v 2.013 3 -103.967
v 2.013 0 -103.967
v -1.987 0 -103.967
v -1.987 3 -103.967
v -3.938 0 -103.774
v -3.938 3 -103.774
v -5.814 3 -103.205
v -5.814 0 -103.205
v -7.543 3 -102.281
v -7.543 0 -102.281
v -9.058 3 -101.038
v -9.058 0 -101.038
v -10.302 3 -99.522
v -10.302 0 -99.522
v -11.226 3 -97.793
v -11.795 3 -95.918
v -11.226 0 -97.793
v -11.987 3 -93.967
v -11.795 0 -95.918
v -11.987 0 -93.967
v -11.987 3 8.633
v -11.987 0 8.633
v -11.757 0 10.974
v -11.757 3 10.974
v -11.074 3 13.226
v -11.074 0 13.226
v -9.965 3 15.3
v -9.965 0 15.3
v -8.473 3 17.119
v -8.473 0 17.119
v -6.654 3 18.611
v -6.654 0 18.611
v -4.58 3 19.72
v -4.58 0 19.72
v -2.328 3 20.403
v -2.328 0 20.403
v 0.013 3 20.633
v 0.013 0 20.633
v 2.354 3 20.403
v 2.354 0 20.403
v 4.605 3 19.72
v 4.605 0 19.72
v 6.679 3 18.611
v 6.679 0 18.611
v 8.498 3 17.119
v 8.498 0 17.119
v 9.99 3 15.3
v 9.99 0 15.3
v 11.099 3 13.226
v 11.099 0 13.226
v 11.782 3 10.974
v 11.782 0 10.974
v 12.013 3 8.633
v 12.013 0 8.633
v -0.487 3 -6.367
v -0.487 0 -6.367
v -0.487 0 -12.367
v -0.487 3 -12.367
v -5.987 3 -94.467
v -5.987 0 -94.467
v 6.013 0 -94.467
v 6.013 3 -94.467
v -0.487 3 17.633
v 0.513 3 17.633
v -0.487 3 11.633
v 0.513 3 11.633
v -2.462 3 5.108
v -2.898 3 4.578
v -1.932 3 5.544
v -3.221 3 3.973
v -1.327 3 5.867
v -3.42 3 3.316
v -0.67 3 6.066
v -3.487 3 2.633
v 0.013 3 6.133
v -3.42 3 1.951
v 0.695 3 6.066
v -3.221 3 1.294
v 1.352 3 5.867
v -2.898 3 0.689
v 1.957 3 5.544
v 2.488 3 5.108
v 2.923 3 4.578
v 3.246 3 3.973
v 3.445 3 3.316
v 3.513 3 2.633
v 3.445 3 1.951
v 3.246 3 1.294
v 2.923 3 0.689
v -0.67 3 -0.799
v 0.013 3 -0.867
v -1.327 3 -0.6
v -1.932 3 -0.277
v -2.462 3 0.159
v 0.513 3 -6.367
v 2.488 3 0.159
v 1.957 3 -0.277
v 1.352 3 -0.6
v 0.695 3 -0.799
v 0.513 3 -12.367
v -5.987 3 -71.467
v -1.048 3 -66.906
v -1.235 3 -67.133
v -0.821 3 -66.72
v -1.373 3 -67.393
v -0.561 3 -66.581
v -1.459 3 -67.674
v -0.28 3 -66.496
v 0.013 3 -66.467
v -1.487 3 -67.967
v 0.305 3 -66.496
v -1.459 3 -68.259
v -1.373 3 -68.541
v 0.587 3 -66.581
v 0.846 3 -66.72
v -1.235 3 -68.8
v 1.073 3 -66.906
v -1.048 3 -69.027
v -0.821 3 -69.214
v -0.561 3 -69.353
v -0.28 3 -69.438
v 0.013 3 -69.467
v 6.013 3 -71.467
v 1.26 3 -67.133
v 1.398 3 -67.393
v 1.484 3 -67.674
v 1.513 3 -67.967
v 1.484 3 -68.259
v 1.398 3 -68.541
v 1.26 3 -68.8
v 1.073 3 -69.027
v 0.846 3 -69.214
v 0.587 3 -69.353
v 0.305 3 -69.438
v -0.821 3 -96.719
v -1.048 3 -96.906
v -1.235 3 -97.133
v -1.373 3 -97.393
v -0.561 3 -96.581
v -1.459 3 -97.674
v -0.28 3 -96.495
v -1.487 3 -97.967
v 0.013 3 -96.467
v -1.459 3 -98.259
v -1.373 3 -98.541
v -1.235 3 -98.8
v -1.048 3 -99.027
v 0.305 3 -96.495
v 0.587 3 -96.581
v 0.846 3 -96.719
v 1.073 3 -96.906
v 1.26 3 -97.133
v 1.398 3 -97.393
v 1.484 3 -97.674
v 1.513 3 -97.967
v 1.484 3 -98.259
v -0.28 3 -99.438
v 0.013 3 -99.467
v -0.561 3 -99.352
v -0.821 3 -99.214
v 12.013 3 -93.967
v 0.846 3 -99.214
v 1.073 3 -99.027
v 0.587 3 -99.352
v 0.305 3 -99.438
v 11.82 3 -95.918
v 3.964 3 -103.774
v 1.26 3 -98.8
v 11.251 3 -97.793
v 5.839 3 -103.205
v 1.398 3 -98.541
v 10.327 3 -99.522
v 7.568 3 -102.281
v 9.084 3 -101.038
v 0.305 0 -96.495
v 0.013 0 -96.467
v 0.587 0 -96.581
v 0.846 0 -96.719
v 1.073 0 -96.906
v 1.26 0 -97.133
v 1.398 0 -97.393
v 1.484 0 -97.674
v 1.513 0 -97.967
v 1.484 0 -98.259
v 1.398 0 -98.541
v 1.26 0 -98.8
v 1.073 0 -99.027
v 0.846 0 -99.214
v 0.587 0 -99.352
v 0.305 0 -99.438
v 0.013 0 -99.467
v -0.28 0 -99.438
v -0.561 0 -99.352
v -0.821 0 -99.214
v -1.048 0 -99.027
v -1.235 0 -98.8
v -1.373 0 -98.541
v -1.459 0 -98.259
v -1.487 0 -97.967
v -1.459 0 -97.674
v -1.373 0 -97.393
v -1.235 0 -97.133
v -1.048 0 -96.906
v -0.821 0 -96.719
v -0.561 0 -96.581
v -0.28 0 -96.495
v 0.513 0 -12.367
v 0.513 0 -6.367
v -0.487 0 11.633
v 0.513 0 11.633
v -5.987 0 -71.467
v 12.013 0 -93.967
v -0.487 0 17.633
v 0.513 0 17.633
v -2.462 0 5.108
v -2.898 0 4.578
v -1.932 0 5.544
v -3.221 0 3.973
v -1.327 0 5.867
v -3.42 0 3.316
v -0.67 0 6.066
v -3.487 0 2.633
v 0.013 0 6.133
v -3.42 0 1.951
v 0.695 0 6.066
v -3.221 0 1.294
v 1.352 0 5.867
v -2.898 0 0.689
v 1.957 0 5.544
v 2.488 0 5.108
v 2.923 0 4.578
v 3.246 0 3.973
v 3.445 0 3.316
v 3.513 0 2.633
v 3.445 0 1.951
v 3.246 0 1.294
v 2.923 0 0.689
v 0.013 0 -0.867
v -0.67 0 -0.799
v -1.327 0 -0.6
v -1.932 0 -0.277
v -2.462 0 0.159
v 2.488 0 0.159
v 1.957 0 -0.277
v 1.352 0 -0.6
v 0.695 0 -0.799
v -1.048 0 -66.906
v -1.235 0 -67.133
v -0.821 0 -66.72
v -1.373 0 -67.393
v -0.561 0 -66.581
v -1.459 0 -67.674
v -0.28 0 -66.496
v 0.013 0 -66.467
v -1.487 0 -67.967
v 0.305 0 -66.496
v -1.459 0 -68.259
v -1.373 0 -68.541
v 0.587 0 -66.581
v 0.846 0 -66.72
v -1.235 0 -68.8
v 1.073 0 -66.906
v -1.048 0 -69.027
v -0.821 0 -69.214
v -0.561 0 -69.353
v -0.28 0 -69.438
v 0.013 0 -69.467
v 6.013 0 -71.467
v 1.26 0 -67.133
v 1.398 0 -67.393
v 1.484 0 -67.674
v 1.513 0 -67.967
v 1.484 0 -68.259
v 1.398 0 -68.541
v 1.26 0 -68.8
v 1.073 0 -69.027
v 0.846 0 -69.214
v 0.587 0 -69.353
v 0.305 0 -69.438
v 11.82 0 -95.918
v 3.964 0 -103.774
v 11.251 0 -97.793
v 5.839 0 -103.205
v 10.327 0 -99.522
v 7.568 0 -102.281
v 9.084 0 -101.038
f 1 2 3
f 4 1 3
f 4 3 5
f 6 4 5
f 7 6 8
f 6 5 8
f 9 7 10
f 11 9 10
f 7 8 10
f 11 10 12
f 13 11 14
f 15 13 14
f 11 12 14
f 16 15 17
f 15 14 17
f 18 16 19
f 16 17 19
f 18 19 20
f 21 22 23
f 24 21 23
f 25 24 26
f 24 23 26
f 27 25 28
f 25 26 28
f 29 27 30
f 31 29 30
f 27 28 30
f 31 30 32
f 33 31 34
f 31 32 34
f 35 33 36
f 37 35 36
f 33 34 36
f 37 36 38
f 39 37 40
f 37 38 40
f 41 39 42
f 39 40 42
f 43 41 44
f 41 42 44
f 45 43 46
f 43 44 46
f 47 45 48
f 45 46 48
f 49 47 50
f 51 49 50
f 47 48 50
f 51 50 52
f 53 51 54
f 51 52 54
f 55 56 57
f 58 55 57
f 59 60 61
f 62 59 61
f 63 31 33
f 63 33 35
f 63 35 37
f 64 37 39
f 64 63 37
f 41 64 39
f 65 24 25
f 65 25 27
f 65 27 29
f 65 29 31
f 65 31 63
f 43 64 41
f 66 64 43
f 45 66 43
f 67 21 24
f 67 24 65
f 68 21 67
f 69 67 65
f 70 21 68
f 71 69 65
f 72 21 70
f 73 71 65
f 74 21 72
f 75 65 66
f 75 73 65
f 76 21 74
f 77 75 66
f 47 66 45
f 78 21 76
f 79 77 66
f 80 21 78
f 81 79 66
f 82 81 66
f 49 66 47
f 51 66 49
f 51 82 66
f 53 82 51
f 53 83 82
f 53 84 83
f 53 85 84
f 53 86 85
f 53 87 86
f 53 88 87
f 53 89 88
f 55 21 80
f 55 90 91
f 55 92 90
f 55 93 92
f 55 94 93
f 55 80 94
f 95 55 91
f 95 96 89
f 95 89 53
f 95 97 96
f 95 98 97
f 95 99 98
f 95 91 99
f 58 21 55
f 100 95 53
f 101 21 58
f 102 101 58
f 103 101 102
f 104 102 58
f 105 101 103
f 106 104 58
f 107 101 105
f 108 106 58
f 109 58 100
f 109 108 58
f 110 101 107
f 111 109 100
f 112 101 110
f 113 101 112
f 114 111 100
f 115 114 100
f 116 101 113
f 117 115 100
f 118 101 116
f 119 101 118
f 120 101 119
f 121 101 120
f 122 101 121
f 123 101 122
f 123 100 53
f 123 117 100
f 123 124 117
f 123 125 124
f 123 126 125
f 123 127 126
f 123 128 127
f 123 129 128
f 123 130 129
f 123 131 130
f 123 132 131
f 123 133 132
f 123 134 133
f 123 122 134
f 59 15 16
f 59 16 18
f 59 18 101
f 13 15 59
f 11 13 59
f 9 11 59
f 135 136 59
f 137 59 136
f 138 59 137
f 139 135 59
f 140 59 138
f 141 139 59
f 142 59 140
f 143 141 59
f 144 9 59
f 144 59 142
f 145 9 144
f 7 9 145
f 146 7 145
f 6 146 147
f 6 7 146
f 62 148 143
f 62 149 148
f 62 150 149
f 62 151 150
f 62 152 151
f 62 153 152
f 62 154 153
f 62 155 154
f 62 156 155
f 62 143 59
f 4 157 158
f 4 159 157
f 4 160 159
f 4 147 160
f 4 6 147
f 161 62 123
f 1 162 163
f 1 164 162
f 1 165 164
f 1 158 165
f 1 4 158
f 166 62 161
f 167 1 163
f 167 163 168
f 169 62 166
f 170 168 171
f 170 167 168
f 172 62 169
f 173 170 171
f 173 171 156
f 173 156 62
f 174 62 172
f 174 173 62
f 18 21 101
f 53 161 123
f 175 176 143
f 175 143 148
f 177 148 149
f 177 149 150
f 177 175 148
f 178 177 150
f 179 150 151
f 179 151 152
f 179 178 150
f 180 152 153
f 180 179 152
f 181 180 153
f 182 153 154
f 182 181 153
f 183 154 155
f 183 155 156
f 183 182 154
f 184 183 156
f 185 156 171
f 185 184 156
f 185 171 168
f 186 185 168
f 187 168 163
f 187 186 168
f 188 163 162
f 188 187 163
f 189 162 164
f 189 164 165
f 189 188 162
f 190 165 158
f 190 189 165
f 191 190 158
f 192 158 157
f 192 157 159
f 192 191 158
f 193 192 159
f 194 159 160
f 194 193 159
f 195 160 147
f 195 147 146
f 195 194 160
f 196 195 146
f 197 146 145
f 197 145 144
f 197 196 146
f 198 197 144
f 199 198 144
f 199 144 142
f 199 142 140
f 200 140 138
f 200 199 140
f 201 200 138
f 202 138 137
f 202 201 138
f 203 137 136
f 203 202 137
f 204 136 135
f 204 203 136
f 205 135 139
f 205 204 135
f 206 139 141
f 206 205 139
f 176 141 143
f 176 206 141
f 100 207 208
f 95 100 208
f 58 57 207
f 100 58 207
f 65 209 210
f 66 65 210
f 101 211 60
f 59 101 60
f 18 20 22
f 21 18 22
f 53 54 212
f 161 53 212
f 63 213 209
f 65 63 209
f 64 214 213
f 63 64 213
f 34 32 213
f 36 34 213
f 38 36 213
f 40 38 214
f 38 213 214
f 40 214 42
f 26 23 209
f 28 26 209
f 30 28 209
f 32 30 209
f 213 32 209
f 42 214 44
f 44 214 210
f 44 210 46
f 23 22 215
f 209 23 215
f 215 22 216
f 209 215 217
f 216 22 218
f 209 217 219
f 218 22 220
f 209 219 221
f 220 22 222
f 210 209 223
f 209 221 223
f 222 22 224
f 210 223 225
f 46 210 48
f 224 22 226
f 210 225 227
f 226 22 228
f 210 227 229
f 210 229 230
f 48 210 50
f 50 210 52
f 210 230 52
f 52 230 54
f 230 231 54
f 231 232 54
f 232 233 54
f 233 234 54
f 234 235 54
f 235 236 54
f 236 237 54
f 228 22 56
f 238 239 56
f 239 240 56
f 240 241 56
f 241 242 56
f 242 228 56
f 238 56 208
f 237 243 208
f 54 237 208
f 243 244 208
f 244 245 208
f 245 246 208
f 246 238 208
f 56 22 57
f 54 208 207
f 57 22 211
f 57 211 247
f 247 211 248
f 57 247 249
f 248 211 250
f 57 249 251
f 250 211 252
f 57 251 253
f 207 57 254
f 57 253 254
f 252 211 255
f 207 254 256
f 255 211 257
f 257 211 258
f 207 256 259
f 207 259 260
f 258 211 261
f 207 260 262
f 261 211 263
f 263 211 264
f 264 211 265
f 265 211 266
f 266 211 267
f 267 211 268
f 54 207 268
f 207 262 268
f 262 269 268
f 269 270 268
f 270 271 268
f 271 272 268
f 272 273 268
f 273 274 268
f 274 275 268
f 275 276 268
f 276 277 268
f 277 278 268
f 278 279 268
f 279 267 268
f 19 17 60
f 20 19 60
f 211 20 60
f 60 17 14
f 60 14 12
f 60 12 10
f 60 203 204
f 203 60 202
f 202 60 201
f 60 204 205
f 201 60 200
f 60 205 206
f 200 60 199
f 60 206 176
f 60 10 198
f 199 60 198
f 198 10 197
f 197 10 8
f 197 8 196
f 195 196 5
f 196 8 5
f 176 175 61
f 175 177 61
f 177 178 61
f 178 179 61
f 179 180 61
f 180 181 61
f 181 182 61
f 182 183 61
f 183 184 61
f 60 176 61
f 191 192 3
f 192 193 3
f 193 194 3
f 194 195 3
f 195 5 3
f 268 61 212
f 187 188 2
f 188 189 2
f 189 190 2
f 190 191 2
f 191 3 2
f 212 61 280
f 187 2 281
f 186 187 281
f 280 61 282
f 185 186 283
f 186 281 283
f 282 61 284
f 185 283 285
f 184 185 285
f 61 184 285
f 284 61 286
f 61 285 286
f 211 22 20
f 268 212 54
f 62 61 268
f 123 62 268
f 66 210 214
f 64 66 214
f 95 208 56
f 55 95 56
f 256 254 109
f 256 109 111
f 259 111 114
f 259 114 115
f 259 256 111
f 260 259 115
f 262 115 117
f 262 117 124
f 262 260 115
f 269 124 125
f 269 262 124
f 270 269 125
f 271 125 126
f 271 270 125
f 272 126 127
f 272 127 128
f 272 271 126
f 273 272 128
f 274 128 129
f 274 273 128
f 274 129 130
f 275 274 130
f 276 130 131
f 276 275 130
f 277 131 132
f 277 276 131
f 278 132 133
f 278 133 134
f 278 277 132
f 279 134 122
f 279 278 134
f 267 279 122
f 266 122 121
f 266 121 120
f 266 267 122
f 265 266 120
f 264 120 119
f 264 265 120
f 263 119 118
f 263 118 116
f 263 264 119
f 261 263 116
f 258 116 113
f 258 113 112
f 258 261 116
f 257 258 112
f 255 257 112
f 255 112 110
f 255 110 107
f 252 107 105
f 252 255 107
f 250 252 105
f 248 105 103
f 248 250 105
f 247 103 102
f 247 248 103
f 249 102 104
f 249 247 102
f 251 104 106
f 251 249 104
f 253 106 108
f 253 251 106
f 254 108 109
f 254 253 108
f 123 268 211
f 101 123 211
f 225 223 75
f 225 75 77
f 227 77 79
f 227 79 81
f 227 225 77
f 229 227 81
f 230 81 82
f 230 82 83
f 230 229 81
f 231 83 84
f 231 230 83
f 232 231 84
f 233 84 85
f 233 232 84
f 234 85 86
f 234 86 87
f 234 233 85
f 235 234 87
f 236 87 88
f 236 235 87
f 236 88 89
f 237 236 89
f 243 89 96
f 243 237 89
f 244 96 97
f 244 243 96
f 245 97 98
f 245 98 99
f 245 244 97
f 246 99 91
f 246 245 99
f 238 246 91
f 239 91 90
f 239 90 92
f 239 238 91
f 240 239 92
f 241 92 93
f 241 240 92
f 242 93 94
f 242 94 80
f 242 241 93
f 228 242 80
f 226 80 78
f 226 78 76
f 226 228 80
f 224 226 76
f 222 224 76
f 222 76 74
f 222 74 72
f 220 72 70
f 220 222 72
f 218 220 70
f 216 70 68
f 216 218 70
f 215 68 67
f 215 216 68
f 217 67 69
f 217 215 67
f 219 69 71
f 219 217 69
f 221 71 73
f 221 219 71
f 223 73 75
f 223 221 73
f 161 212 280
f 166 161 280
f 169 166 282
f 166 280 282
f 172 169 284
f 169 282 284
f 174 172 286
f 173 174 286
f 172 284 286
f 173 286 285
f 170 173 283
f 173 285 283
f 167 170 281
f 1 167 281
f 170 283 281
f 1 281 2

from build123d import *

# Parameters (mm, degrees)
ESBO_O4_R                = 3.5
ESBO_O4_R_2              = 1.5
RESSALTO_EXTRUS_O1_DEPTH = 3


with BuildPart() as part:
    # Esboço4 → Ressalto-extrusão1 (new body)
    with BuildSketch(Plane(origin=(0, 0, 0), x_dir=(1, 0, 0), z_dir=(0, 1, 0))):
        with BuildLine():
            Line((-11.987372598, 93.966613318), (-11.987372598, 71.466613318))
            Line((-11.987372598, 71.466613318), (-11.987372598, -8.633386682))
            ThreePointArc((-11.987372598, -8.633386682), (0.012627402, -20.633386682), (12.012627402, -8.633386682))
            Line((12.012627402, -8.633386682), (12.012627402, 71.466613318))
            Line((12.012627402, 71.466613318), (12.012627402, 93.966613318))
            ThreePointArc((12.012627402, 93.966613318), (9.083695214, 101.03768113), (2.012627402, 103.966613318))
            Line((2.012627402, 103.966613318), (0.012627402, 103.966613318))
            Line((0.012627402, 103.966613318), (-1.987372598, 103.966613318))
            ThreePointArc((-1.987372598, 103.966613318), (-9.05844041, 101.03768113), (-11.987372598, 93.966613318))
        make_face()
        Polygon((0.512627402, -17.633386682), (0.012627402, -17.633386682), (-0.487372598, -17.633386682), (-0.487372598, -11.633386682), (0.512627402, -11.633386682), align=None, mode=Mode.SUBTRACT)
        with Locations(Location((0.012627402, -2.633386682, 0), (0, 0, 270))):
            Circle(ESBO_O4_R, mode=Mode.SUBTRACT)
        Polygon((0.012627402, 12.366613318), (0.512627402, 12.366613318), (0.512627402, 6.366613318), (-0.487372598, 6.366613318), (-0.487372598, 12.366613318), align=None, mode=Mode.SUBTRACT)
        with Locations(Location((0.012627402, 67.966742295, 0), (0, 0, 270))):
            Circle(ESBO_O4_R_2, mode=Mode.SUBTRACT)
        Polygon((6.012627402, 94.466613318), (6.012627402, 71.466613318), (2.487372598, 71.466613318), (-2.487372598, 71.466613318), (-5.987372598, 71.466613318), (-5.987372598, 82.966613318), (-5.987372598, 94.466613318), (-2.5, 94.466613318), (2.5, 94.466613318), align=None, mode=Mode.SUBTRACT)
        with Locations(Location((0.012627402, 97.966613318, 0), (0, 0, 270))):
            Circle(ESBO_O4_R_2, mode=Mode.SUBTRACT)
    extrude(amount=RESSALTO_EXTRUS_O1_DEPTH)


solid = part.part
